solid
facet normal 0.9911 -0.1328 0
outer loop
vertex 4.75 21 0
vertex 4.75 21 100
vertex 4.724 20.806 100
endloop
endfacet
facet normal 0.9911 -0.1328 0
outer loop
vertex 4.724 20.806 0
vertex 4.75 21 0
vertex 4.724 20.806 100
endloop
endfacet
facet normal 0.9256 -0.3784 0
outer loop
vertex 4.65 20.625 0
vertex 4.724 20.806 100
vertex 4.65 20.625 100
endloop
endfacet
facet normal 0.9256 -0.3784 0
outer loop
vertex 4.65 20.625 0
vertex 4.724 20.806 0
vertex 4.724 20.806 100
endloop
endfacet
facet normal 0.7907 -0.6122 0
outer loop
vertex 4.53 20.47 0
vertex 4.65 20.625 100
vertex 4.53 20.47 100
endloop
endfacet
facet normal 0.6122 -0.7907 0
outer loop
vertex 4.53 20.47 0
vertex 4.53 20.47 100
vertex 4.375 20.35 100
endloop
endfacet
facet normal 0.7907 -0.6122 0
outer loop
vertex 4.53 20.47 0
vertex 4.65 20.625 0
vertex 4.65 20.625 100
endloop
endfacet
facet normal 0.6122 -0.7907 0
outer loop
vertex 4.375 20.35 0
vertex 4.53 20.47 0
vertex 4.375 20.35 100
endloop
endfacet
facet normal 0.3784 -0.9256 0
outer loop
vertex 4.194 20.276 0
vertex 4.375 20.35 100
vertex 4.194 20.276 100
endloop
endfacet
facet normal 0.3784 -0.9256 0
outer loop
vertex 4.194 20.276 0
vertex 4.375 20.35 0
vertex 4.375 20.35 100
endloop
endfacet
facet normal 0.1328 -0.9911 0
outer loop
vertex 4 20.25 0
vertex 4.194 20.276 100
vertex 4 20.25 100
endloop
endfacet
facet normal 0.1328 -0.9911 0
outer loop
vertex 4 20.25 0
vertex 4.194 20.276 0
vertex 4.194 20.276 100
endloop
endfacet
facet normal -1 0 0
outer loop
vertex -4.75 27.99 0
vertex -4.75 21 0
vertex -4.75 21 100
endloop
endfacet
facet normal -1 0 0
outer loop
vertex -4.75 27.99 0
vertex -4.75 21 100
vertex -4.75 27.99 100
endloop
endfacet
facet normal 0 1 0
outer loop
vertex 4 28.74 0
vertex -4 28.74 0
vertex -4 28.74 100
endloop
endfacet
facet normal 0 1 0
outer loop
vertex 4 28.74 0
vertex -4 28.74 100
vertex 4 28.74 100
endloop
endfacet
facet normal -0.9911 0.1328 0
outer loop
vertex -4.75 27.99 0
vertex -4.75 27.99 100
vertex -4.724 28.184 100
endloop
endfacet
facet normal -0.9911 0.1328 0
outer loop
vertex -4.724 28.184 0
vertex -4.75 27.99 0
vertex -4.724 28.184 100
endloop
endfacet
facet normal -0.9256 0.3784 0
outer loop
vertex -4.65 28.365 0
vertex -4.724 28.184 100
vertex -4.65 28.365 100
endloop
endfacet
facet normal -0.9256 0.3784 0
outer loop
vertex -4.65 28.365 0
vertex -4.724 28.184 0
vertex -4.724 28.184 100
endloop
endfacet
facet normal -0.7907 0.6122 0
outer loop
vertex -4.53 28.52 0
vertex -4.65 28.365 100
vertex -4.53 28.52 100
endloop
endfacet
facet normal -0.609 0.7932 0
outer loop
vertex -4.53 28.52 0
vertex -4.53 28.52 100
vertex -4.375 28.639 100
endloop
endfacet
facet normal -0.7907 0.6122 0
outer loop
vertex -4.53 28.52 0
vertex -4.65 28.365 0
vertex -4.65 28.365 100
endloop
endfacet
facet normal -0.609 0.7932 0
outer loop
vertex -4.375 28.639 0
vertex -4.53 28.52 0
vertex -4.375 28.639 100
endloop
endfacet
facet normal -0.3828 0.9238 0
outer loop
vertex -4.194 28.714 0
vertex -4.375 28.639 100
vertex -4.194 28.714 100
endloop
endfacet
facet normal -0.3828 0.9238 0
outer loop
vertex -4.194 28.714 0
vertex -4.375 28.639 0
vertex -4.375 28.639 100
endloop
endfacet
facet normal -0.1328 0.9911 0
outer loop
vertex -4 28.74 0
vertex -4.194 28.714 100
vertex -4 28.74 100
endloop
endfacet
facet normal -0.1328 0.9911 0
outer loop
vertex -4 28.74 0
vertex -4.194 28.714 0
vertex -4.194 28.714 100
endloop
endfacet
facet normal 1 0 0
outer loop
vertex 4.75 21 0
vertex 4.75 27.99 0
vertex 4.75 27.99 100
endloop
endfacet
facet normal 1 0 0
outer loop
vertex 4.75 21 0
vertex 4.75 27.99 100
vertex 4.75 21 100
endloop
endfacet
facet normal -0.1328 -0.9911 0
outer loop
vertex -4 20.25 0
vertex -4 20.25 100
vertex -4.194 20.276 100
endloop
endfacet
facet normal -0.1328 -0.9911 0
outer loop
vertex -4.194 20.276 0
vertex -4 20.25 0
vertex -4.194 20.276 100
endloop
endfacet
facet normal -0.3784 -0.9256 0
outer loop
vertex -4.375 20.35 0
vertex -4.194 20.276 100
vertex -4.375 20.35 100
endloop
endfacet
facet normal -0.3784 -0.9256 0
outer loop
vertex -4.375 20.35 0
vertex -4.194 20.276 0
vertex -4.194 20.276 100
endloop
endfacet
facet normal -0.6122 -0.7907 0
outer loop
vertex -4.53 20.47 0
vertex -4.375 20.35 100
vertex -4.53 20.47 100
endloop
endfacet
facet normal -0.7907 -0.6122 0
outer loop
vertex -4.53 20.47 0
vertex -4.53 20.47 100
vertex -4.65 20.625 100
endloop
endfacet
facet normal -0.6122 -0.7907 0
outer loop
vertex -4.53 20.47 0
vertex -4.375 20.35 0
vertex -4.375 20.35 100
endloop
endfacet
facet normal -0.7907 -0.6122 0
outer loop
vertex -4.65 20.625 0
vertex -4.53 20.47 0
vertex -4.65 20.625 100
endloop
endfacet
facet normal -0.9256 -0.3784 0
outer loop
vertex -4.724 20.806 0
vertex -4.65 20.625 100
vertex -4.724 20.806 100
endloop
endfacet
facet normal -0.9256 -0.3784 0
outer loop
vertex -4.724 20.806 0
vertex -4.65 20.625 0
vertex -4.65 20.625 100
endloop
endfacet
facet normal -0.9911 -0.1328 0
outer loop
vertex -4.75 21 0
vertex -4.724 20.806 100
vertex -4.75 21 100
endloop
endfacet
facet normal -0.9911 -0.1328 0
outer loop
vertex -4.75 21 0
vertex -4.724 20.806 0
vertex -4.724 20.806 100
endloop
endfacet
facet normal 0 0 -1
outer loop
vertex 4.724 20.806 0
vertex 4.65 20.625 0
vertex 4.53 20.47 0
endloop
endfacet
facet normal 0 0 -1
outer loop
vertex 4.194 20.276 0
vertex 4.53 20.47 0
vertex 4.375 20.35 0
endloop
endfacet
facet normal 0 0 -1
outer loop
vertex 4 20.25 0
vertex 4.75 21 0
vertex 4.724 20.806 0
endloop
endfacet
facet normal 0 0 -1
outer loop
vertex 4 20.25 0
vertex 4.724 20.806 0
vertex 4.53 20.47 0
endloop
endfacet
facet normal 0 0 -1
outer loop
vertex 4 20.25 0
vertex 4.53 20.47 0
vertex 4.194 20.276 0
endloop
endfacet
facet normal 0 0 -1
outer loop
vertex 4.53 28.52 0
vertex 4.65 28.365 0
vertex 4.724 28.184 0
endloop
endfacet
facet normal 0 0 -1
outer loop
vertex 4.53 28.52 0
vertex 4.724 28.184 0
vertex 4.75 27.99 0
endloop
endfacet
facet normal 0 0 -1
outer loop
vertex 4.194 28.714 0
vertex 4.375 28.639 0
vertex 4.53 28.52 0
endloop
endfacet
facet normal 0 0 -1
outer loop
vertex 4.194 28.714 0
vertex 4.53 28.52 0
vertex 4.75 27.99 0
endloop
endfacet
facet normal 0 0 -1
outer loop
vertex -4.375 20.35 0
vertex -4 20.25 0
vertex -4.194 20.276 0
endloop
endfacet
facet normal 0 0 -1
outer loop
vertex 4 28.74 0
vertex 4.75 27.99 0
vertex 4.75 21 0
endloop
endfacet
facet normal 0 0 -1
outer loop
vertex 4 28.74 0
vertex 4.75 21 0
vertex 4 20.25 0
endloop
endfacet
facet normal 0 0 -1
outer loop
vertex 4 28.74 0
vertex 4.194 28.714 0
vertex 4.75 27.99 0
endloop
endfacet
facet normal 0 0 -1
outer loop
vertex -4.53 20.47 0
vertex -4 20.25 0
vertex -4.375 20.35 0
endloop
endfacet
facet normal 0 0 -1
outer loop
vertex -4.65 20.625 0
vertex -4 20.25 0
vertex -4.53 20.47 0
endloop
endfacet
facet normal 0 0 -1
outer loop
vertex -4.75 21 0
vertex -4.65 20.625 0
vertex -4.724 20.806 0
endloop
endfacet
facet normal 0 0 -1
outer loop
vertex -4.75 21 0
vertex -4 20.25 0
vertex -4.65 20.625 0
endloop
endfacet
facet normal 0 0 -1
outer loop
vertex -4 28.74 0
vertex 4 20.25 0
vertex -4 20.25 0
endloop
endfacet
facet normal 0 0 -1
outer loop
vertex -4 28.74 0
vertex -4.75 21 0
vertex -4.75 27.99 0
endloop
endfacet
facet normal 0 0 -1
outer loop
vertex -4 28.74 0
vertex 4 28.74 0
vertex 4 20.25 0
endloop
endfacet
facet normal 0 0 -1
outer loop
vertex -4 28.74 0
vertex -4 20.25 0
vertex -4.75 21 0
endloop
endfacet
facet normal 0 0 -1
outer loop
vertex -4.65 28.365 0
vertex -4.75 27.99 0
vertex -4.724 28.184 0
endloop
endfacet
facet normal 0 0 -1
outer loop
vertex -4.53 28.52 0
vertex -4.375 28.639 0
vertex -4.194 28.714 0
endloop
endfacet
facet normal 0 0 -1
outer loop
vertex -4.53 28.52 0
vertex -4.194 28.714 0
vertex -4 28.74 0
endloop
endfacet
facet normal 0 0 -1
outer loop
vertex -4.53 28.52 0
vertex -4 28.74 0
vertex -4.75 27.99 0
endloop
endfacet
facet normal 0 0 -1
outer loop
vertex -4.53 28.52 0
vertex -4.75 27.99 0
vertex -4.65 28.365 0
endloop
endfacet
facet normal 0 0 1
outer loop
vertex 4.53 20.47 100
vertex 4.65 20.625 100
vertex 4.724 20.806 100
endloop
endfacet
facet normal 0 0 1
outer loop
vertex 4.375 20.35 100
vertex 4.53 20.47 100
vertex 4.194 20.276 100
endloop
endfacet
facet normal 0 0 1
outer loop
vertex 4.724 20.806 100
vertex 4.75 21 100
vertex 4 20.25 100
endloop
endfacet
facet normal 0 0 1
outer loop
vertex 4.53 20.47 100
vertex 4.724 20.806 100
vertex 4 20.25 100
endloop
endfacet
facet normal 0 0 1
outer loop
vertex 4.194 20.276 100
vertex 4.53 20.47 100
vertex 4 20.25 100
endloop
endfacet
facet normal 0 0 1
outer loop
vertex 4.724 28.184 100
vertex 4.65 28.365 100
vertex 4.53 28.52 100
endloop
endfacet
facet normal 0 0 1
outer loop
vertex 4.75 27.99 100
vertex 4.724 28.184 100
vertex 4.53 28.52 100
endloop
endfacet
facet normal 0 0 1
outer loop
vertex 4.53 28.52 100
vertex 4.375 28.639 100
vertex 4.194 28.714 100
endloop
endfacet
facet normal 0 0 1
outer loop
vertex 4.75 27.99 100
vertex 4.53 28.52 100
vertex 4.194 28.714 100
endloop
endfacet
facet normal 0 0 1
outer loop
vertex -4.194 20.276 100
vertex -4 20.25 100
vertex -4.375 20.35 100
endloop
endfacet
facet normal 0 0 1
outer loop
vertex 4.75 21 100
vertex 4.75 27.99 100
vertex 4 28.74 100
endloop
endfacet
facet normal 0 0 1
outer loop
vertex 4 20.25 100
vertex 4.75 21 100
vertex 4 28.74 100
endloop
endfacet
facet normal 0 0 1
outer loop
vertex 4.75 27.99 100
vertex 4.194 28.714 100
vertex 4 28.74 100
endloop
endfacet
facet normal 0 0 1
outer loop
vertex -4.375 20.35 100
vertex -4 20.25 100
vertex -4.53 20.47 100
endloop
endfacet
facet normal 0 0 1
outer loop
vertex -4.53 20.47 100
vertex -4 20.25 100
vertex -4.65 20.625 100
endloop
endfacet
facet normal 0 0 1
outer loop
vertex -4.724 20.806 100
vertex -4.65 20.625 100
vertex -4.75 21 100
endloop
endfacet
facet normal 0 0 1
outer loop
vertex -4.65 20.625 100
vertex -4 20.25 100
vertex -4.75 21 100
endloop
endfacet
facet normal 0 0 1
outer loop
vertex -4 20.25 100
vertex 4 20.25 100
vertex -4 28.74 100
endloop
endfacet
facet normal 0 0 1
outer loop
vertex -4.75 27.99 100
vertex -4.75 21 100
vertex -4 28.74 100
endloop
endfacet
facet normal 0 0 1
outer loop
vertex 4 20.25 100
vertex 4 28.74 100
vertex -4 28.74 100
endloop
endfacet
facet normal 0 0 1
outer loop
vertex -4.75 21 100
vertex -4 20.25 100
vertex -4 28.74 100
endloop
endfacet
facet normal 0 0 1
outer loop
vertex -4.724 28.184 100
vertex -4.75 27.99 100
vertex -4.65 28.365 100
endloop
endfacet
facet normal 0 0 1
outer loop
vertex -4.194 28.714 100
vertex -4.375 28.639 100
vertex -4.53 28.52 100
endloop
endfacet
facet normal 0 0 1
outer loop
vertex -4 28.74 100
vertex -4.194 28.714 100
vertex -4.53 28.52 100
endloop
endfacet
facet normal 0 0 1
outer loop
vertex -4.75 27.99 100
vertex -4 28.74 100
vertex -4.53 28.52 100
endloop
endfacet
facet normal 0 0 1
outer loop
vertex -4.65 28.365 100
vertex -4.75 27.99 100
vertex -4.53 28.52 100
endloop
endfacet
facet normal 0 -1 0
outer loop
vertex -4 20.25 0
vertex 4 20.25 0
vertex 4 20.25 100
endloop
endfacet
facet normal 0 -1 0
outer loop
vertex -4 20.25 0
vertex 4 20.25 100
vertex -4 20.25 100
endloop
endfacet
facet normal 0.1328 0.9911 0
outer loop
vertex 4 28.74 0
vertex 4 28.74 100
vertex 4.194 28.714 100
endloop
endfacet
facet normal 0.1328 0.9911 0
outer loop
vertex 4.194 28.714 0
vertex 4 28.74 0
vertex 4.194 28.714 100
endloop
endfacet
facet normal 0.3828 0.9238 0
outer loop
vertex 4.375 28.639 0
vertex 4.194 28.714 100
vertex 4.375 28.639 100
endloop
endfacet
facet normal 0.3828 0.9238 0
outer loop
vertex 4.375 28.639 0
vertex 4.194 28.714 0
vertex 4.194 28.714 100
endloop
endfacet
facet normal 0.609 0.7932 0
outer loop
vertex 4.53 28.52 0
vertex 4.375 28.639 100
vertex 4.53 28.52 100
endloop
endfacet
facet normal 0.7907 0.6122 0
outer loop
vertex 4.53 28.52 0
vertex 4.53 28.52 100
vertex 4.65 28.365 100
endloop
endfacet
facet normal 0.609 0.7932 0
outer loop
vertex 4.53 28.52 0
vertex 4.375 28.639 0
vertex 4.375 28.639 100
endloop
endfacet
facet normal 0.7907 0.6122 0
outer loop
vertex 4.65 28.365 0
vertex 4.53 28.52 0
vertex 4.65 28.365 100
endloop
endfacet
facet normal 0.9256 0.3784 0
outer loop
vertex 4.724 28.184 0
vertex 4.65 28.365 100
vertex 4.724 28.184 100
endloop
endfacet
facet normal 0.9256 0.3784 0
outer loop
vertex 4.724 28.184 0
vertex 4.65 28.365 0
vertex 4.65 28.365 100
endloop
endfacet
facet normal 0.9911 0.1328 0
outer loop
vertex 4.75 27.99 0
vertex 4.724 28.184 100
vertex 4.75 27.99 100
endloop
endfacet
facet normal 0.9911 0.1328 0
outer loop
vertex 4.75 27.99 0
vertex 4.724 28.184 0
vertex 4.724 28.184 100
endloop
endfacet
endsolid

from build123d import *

# Parameters (mm, degrees)
Y_KSEKLIK_EKSTR_ZYON1_DEPTH = 100


with BuildPart() as part:
    # Model → Yükseklik-Ekstrüzyon1 (new body)
    with BuildSketch(Plane.XY):
        with BuildLine():
            ThreePointArc((-4.75, 27.989794856), (-4.530330086, 28.520124942), (-4, 28.739794856))
            Line((-4, 28.739794856), (0, 28.739794856))
            Line((0, 28.739794856), (4, 28.739794856))
            ThreePointArc((4, 28.739794856), (4.530330086, 28.520124942), (4.75, 27.989794856))
            Line((4.75, 27.989794856), (4.75, 21))
            ThreePointArc((4.75, 21), (4.530330086, 20.469669914), (4, 20.25))
            Line((4, 20.25), (0, 20.25))
            Line((0, 20.25), (-4, 20.25))
            ThreePointArc((-4, 20.25), (-4.530330086, 20.469669914), (-4.75, 21))
            Line((-4.75, 21), (-4.75, 27.989794856))
        make_face()
    extrude(amount=Y_KSEKLIK_EKSTR_ZYON1_DEPTH)


solid = part.part
